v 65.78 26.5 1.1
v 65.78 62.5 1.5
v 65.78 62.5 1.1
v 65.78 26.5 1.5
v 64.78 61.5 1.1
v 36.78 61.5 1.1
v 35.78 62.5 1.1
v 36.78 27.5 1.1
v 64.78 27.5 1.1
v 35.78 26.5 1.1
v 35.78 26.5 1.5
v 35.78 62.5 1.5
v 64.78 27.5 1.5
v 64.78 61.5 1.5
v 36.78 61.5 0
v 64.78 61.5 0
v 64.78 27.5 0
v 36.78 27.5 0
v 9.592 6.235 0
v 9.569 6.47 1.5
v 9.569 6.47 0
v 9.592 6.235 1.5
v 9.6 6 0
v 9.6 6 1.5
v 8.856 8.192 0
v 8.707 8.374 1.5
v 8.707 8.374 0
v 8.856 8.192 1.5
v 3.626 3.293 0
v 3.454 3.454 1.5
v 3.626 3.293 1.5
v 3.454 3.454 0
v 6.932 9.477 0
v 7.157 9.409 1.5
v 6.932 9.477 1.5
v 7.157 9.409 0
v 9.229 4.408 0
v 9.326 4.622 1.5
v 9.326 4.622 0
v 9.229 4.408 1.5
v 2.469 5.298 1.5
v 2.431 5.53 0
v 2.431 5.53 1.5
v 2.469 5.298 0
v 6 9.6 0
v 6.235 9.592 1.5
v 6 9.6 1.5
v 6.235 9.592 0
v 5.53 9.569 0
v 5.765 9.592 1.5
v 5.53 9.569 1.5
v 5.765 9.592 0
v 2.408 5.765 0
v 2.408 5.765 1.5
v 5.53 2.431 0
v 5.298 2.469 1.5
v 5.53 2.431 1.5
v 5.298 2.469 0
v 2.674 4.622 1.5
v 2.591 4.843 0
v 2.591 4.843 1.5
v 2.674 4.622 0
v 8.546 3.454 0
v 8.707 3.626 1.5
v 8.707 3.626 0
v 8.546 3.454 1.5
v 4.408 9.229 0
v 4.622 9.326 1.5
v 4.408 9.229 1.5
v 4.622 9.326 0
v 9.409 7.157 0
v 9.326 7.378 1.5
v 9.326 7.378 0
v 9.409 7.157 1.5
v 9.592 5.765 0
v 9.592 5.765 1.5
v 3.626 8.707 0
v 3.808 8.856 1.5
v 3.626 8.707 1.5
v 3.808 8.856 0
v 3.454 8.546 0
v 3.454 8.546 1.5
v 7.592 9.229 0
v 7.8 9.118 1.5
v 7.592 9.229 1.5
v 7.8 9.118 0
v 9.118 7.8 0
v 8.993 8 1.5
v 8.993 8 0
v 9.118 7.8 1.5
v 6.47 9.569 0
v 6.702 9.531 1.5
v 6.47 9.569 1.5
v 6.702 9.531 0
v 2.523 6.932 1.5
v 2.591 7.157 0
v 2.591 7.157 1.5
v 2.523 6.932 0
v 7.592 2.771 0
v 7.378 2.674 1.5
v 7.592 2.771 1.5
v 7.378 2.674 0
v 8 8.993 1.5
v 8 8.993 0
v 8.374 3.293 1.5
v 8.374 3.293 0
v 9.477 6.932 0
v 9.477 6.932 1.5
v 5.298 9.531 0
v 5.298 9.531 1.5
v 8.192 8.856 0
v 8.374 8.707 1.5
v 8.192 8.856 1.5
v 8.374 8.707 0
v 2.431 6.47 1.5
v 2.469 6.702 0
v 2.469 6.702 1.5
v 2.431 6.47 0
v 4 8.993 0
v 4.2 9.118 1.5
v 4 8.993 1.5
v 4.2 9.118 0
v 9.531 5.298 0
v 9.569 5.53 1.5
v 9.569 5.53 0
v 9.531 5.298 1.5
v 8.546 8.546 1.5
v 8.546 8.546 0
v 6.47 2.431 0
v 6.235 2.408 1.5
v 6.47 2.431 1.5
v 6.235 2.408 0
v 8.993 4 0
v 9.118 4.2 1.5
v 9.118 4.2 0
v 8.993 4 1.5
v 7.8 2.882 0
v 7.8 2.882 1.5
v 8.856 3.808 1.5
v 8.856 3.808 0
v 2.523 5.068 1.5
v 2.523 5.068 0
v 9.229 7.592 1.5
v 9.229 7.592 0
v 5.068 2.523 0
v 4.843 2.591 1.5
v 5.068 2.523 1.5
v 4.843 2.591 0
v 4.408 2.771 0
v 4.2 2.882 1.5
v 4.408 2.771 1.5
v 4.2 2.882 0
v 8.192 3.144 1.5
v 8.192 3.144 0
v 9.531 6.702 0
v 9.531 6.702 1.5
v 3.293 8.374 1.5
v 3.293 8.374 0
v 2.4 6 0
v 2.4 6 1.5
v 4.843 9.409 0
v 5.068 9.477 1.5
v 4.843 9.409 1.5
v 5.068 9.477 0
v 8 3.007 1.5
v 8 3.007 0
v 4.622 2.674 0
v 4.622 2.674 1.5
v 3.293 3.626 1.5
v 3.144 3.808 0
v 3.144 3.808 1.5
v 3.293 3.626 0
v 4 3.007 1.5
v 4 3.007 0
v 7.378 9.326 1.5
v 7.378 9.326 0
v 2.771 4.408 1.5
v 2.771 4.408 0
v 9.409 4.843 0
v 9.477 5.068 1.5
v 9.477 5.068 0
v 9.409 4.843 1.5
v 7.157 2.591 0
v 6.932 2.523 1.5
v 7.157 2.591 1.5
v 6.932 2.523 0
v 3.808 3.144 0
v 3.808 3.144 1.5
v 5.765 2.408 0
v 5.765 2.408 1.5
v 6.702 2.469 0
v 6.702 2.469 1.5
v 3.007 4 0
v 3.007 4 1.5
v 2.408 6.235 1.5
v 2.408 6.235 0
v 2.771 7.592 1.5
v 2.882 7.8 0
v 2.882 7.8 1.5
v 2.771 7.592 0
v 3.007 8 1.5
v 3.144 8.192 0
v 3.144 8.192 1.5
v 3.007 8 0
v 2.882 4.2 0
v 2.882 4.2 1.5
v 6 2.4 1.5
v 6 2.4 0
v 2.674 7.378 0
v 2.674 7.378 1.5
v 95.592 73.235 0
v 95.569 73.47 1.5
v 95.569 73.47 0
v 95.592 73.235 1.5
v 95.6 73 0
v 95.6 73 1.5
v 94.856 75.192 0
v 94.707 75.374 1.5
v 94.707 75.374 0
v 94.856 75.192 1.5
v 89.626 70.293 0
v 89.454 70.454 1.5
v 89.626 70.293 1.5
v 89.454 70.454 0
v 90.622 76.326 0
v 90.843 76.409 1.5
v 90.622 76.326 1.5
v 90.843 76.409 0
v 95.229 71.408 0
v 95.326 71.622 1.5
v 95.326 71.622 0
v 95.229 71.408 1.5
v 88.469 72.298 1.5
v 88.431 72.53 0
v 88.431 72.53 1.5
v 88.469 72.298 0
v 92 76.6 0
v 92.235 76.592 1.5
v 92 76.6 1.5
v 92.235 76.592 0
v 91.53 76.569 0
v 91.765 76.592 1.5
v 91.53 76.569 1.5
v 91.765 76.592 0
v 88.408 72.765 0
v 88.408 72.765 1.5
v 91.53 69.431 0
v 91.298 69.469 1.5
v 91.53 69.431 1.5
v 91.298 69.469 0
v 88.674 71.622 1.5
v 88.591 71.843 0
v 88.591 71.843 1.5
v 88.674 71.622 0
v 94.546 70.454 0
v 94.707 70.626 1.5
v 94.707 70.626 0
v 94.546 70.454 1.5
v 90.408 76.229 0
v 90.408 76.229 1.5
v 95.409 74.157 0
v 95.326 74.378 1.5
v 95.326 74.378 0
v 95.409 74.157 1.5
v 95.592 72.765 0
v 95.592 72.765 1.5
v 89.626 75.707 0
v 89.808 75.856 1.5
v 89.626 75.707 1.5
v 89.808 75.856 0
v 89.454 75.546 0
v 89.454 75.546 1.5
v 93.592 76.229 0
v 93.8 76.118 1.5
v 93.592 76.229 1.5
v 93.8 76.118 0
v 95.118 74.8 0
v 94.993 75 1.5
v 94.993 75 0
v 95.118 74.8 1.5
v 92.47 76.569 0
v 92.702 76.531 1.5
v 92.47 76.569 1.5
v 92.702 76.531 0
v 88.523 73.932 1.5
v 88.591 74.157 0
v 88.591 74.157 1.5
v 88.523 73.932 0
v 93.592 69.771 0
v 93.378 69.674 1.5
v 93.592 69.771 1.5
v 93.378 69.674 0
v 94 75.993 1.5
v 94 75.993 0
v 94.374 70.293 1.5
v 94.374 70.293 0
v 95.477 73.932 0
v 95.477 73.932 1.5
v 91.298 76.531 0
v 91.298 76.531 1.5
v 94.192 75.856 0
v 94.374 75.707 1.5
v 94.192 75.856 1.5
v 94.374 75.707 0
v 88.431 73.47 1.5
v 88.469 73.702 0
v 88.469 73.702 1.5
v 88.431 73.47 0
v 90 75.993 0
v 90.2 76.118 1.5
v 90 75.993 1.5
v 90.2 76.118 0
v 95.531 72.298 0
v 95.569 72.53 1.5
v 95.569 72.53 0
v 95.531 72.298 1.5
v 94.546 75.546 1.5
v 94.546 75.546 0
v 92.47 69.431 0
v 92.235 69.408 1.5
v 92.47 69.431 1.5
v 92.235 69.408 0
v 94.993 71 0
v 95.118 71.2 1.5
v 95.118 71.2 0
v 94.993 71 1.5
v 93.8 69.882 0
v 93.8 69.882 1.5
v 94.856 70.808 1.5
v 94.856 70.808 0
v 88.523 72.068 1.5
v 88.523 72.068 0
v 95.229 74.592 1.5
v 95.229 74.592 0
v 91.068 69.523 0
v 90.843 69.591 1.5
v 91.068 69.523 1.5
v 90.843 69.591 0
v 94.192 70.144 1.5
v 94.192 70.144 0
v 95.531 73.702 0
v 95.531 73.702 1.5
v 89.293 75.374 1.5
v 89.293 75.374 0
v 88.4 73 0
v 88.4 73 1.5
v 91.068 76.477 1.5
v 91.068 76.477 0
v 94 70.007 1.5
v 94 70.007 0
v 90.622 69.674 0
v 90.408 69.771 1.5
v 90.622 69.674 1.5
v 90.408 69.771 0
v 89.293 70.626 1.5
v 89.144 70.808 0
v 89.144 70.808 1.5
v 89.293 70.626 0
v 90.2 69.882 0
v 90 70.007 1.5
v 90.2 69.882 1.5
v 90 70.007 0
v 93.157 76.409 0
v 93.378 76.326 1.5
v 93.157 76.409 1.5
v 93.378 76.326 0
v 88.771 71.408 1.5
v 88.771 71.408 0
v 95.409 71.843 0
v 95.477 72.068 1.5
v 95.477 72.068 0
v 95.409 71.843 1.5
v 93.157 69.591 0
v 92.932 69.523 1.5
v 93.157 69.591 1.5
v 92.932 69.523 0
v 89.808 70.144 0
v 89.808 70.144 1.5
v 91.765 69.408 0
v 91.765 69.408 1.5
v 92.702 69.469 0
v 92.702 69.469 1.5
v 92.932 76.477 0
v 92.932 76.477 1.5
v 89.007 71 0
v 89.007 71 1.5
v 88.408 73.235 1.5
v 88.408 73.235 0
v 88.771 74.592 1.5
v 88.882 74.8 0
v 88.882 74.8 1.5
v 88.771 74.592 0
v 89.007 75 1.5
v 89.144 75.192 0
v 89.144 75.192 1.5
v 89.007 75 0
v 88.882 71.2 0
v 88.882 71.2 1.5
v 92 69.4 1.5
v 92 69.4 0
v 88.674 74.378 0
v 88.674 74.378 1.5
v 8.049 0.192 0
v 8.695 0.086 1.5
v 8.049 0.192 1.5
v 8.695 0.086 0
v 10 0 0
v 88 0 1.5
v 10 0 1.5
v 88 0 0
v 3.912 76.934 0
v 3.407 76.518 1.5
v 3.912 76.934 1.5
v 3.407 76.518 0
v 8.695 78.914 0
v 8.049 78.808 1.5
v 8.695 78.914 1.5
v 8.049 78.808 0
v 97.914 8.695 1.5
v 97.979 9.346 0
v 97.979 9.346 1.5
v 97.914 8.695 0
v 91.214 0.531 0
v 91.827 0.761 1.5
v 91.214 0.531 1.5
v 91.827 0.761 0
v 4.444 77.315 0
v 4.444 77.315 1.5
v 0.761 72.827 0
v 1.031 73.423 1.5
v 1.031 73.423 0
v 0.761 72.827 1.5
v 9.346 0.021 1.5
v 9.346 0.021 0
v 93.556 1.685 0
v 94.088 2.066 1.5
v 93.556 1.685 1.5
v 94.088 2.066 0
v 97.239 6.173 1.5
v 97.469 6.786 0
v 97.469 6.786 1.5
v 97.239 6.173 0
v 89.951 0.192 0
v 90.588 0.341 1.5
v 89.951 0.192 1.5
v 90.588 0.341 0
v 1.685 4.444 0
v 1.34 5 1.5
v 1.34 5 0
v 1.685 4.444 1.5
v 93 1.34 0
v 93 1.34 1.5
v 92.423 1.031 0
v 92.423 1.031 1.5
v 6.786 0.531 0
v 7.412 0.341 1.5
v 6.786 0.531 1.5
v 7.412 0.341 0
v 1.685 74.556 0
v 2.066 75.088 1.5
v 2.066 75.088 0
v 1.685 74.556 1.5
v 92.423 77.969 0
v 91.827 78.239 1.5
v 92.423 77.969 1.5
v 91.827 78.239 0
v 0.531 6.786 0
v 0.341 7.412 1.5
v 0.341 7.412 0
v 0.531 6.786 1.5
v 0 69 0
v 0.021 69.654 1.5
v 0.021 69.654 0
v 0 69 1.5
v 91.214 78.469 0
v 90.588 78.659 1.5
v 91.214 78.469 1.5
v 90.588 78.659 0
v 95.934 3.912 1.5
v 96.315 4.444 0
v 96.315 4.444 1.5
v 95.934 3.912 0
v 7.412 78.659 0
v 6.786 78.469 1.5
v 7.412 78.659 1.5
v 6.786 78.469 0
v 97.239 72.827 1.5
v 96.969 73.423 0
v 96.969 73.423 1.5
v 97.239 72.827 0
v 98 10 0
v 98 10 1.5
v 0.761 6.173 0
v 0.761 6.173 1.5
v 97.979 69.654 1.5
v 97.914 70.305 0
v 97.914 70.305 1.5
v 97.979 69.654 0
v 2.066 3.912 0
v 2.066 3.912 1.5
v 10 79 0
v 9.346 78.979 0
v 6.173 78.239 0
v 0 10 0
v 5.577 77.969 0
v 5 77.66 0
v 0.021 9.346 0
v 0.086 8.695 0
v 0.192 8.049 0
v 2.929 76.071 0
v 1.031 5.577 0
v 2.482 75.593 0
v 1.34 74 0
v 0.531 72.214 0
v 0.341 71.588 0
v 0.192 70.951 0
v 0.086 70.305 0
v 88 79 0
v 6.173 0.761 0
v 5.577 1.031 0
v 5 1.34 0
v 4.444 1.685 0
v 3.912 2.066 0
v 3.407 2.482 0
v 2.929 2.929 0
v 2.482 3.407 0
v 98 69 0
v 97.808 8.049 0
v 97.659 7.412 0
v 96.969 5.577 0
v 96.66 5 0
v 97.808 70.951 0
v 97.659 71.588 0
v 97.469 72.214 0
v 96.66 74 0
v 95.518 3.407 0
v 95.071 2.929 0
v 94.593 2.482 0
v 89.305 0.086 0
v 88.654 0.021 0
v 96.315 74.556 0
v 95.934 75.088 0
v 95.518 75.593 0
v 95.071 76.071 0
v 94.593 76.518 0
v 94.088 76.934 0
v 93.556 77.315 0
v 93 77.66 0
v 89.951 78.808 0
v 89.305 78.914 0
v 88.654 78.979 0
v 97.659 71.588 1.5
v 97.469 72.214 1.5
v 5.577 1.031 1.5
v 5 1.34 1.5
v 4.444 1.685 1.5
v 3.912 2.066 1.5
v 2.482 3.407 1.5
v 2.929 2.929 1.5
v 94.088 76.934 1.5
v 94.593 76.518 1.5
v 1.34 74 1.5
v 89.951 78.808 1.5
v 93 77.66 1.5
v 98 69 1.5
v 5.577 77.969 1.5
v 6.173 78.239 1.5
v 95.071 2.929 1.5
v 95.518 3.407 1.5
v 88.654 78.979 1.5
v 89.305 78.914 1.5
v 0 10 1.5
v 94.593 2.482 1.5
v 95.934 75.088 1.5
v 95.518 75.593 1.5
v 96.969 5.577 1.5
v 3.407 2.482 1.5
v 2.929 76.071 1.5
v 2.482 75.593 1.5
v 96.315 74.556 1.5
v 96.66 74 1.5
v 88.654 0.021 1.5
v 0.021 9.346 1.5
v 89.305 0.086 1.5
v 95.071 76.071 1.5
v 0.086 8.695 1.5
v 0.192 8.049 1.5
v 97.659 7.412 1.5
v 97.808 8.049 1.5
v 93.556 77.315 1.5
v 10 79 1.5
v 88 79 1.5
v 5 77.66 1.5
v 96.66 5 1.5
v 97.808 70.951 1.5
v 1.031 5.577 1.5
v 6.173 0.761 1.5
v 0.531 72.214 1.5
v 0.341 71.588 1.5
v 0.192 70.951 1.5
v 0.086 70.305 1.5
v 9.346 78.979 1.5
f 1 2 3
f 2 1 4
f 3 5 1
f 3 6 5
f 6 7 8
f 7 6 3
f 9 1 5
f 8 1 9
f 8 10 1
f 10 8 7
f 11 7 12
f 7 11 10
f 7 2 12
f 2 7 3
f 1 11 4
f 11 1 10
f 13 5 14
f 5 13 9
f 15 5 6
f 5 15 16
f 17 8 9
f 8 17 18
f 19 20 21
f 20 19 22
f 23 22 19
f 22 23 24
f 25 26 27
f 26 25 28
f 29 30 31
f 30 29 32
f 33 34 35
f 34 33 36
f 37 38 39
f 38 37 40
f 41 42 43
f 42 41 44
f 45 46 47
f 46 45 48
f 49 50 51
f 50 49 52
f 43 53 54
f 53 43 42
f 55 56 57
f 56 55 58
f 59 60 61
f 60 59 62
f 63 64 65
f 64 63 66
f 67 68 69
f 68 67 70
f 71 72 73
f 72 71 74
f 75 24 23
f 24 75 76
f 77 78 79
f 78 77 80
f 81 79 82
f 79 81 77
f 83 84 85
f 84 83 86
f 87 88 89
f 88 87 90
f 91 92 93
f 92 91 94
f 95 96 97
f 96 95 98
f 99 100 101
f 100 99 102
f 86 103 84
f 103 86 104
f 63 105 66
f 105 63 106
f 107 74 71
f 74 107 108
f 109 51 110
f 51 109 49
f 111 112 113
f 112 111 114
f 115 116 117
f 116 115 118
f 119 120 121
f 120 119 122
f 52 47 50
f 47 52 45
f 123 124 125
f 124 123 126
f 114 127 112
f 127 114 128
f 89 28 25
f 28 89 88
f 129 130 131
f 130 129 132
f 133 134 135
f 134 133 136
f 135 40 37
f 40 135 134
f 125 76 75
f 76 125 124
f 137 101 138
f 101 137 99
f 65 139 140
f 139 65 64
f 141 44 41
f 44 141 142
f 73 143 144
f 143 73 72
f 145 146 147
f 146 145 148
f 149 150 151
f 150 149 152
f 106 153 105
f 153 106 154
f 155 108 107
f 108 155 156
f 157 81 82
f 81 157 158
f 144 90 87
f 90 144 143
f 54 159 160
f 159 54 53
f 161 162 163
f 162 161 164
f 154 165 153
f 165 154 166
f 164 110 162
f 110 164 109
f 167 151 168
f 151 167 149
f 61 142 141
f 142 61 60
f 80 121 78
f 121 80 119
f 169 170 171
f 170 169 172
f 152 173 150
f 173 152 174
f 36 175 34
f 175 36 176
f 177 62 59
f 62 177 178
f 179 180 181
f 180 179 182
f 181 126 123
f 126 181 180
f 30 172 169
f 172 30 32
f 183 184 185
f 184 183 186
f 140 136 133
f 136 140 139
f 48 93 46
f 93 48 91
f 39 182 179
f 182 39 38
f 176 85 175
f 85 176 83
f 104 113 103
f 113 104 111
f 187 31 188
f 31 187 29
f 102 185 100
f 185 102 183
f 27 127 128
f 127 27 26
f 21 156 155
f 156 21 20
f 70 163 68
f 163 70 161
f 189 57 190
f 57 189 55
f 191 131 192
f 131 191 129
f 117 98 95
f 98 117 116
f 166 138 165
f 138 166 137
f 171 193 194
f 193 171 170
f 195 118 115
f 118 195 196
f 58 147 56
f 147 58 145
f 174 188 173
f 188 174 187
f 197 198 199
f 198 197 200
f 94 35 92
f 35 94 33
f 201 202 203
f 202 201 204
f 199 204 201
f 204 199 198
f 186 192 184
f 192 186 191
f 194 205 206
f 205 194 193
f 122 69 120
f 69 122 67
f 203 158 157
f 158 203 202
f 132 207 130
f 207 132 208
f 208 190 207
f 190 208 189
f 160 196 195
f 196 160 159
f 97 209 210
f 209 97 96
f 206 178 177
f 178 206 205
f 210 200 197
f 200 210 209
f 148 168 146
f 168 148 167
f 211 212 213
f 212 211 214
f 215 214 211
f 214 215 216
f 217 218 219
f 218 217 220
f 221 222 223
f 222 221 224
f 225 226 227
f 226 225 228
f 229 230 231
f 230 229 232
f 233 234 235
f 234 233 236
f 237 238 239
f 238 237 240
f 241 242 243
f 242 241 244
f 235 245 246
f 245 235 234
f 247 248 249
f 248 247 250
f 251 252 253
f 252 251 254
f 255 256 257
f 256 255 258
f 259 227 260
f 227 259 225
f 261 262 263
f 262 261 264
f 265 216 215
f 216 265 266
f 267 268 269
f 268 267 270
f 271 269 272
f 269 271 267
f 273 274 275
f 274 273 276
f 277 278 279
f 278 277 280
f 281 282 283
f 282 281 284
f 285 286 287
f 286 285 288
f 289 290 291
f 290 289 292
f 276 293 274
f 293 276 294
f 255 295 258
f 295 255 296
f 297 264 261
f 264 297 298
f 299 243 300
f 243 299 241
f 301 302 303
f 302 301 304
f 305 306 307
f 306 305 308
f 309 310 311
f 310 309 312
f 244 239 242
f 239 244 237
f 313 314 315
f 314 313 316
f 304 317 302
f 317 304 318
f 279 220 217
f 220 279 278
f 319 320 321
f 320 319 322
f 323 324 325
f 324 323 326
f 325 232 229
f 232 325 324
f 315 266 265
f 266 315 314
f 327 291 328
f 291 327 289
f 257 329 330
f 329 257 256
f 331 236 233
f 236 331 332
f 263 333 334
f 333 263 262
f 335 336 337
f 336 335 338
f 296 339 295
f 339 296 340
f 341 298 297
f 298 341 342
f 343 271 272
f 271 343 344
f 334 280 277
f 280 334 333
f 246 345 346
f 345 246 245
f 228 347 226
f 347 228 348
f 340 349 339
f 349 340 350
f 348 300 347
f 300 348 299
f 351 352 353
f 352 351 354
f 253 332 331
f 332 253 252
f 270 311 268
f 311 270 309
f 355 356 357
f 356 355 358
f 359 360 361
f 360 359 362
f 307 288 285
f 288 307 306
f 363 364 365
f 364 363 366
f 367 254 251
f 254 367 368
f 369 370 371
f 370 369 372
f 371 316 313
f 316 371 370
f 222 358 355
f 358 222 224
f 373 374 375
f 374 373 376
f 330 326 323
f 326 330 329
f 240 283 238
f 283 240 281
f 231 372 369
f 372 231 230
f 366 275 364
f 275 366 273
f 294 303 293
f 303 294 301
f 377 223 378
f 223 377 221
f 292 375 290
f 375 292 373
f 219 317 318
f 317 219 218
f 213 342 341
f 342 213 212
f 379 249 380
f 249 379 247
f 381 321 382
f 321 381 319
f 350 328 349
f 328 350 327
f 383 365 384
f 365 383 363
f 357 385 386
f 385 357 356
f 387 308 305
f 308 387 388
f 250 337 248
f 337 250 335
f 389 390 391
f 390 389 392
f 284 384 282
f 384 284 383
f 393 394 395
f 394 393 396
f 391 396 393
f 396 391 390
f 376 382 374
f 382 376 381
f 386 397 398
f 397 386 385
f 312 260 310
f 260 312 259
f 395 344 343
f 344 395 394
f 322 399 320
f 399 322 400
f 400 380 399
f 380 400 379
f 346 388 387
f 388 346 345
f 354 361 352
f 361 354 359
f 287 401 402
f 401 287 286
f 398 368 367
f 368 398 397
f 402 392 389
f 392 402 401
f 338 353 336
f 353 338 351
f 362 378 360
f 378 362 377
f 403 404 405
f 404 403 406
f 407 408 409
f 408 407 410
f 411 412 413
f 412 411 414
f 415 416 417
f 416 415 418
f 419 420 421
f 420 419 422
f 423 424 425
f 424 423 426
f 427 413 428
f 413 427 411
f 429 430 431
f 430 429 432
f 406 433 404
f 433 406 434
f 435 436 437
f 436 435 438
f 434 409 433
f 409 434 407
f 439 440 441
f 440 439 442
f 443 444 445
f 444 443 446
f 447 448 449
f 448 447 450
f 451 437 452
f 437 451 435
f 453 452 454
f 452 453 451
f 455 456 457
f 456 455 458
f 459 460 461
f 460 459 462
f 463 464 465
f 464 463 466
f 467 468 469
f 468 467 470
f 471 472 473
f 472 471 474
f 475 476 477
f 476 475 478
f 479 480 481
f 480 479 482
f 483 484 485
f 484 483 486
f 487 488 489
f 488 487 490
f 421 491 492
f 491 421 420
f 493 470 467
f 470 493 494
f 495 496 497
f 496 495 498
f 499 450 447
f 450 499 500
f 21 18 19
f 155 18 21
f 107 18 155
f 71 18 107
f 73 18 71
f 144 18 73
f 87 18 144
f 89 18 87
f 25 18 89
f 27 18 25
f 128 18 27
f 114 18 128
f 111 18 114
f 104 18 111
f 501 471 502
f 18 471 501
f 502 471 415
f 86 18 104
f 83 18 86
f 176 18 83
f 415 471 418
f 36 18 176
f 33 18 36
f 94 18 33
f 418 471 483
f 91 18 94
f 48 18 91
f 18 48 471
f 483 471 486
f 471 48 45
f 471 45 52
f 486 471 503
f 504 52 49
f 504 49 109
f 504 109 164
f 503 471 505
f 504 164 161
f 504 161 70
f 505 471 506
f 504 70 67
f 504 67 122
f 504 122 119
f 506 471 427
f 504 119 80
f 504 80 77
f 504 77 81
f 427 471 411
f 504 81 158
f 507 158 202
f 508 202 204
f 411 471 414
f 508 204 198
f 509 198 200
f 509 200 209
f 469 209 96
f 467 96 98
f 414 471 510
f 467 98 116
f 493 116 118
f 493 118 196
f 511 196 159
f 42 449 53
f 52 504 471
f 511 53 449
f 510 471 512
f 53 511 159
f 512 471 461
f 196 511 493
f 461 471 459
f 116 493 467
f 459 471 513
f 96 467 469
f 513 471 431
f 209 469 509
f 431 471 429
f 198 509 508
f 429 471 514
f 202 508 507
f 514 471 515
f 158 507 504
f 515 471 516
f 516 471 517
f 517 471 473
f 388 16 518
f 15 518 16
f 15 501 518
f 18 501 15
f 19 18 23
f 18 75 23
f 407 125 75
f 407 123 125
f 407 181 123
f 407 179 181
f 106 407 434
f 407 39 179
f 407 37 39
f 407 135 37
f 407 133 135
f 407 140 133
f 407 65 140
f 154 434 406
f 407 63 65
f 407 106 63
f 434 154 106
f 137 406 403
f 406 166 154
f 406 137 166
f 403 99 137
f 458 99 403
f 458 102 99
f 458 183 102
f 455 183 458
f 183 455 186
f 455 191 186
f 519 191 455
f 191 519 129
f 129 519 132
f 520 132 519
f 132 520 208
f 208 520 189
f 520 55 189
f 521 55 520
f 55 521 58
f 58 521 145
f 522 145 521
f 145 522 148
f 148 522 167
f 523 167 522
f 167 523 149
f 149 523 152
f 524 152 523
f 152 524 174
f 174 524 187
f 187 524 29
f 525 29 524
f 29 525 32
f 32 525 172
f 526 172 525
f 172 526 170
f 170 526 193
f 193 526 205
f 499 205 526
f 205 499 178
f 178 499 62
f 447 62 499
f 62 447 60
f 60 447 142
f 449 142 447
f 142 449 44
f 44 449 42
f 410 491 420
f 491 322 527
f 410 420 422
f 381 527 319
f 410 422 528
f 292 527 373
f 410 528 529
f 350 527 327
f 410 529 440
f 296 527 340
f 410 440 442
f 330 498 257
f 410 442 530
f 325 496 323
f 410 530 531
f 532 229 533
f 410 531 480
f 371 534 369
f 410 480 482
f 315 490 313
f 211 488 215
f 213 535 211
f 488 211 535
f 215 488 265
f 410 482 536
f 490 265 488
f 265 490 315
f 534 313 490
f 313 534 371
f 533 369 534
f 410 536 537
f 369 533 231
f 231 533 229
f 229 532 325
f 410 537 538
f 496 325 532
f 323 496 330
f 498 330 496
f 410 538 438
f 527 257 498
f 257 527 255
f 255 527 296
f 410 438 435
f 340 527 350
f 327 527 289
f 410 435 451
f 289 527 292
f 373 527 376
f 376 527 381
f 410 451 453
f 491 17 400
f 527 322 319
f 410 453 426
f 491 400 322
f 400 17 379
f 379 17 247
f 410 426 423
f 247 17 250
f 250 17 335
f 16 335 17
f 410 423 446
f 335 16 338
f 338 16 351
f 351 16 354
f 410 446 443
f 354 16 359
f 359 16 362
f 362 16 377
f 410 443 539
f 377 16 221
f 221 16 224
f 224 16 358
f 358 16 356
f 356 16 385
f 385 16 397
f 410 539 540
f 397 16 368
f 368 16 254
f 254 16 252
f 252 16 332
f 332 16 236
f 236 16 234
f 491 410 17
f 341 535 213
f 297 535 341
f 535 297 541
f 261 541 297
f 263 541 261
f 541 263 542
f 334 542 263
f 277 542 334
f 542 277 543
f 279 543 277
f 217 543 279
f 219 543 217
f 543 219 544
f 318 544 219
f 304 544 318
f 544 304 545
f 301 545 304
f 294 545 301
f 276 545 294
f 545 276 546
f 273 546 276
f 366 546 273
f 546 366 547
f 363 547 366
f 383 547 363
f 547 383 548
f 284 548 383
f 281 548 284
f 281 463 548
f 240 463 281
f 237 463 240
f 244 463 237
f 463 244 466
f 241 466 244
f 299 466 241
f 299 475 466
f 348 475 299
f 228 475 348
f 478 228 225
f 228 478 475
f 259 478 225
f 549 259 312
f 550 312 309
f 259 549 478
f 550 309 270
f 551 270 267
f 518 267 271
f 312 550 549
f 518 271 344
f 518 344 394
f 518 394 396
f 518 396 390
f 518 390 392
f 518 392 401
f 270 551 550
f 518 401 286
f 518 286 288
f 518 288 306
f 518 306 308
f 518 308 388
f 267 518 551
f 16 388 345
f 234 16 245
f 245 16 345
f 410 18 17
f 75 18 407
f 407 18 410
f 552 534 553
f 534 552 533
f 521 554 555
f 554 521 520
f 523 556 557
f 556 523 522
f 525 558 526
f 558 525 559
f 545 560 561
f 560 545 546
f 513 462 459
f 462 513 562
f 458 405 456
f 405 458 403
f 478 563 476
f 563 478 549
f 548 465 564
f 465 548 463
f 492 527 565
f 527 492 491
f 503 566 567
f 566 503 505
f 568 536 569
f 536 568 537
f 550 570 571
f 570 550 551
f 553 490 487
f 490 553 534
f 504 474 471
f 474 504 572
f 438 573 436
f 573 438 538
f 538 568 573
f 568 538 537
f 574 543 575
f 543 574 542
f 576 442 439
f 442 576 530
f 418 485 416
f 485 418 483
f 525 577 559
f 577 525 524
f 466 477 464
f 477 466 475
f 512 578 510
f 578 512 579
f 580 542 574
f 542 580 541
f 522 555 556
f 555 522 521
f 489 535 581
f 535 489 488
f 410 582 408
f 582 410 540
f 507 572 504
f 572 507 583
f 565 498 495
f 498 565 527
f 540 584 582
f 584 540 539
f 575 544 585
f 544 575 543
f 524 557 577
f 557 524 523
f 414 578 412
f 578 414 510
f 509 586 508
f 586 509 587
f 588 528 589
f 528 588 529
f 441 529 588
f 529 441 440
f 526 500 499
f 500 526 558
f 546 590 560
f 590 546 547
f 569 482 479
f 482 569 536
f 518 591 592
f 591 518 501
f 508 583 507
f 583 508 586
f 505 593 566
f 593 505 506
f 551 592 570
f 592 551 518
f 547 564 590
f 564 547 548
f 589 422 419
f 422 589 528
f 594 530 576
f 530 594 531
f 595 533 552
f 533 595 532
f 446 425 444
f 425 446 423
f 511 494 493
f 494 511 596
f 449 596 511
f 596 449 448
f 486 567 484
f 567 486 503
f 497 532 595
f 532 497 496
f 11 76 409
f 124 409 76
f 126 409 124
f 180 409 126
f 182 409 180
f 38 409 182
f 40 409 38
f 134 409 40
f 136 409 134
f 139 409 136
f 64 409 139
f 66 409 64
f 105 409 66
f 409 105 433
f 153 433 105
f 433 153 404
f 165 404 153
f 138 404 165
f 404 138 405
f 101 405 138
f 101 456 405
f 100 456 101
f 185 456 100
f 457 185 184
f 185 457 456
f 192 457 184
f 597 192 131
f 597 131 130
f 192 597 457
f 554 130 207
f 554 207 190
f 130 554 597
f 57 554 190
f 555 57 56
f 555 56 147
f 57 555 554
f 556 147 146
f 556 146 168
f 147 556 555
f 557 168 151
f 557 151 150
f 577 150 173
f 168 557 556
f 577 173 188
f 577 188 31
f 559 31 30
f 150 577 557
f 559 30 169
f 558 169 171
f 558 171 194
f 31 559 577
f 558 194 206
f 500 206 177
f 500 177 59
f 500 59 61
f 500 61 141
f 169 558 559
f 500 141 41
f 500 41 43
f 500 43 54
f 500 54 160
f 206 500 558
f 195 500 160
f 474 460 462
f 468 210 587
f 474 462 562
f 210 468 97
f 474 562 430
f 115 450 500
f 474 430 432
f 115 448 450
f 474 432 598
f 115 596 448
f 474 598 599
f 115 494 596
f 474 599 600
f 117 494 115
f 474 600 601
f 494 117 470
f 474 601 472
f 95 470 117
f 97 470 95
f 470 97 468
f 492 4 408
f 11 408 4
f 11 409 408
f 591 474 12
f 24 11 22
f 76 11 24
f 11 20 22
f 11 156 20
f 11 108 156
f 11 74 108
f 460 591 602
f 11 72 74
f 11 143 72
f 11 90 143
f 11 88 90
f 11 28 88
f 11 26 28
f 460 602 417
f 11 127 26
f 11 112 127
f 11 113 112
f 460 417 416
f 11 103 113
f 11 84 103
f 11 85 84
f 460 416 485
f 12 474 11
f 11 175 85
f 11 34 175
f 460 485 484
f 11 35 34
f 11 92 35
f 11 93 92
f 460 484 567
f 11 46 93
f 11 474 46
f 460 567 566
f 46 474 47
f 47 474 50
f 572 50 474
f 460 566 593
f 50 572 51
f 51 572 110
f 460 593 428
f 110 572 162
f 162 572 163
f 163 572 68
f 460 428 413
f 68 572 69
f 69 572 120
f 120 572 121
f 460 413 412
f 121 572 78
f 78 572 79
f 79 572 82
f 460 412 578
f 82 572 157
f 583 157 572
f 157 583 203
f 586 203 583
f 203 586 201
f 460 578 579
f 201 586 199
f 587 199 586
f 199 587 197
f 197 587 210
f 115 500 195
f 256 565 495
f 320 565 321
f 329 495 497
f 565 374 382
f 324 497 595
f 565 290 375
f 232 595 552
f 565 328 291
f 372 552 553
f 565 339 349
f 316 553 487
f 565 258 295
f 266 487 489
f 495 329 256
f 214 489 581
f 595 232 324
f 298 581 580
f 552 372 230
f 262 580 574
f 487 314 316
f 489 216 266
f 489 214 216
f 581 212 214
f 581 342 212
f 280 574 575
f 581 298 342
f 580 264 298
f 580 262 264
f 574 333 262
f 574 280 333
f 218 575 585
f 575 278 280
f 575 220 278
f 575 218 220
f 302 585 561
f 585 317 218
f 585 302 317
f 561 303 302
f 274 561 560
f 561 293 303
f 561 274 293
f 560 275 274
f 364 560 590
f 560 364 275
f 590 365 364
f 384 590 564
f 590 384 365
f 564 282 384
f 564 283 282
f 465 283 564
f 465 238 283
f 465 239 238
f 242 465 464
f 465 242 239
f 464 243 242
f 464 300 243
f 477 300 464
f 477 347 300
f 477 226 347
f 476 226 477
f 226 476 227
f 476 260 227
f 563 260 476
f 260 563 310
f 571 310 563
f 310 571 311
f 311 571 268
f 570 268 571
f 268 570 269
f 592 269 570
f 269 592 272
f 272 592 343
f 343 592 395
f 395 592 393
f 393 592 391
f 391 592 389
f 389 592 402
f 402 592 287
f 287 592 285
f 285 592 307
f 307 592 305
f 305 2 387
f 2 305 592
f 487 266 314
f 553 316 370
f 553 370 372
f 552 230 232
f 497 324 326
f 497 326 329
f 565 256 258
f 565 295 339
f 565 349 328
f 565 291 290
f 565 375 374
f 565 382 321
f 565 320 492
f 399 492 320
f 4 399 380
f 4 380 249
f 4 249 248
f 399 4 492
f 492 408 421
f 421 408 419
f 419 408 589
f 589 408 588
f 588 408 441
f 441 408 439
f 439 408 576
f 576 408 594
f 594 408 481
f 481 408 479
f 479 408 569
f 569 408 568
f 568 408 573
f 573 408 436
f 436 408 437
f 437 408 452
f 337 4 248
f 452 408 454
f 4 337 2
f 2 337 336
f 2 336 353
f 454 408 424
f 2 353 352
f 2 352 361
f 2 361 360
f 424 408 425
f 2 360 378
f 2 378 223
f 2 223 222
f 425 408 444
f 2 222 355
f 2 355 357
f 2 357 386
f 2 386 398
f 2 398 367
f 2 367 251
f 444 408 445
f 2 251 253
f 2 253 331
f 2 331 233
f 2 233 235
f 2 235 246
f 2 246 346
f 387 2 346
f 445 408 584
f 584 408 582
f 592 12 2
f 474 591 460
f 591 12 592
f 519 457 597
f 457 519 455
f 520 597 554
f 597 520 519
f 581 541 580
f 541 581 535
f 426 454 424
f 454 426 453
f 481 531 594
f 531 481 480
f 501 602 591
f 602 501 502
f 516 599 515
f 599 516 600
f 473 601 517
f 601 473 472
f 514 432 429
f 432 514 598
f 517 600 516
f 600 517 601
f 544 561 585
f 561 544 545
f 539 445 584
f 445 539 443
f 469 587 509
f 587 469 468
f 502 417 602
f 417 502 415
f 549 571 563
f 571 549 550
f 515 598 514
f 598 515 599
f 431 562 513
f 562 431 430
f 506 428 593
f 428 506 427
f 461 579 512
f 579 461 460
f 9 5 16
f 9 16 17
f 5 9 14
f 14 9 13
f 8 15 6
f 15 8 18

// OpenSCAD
// =============================================================================
// SupaClock V3 - Faceplate (skin intercambiable, plug-and-play)
//
// Pieza cosmetica que se monta sobre el top_case core mediante:
//   retention = "snap"     -> 2 cantilevers macho + 2 pines guia
//   retention = "magnetic" -> 4 imanes Ø5x2 embebidos + 2 pines guia
//
// Estilos disponibles:
//   style = "minimal"  -> sin decoracion, solo bezel display
//   style = "classic"  -> 12 marcas horarias grabadas
//   style = "sport"    -> bezel grueso con numerales 5/15/25/35/45/55
//
// Coords case-local. Z=0 = cara inferior del faceplate (apoya sobre techo
// del core a Z_abs = H_total = 17). Z=2 = cara exterior superior.
// =============================================================================

$fn = 96;
eps = 0.01;

// ============================ PARAMETROS PRINCIPALES =========================
retention = "magnetic";    // "magnetic" | "snap"
style     = "minimal";     // "minimal" | "classic" | "sport"
// =============================================================================

// ---------------------------- DIMENSIONES BASE -------------------------------
outer_x        = 98.0;
outer_y        = 79.0;
r_vert         = 12.0;
taper          = 2.0;
H_total        = 17.0;
pcb_off_x      = 6.5;
pcb_off_y      = 6.0;
grosor_pared   = 2.0;

faceplate_slab = 1.5;    // espesor del slab cosmetico
retention_h    = 3.0;    // largo de los pins / cantilevers hacia abajo
faceplate_total_z = faceplate_slab + 0.5;  // = 2.0 mm visible

// El radio del faceplate sigue al envelope al Z=H_total (cara superior del core)
r_face = r_vert - taper;   // = 10 mm

// ---------------------- DISPLAY ----------------------------------------------
display_pos    = [44.28, 38.5];
display_w      = 28.0;
display_h      = 34.0;
bezel_extra    = 2.0;     // bezel cosmetico de 2 mm alrededor de la ventana
bezel_depth    = 0.4;     // recess en la cara superior

// ---------------------- RETENTION (mismo que top_case) -----------------------
// V3.2: diagonal SW-NE con 2 imanes Ø7 x 1.5 mm, otras 2 esquinas con pines
// guia macho Ø2 mm que entran a los huecos del core.
ret_inset     = 6.0;
ret_positions = [
    [ret_inset,             ret_inset],            // SW - iman
    [outer_x - ret_inset,   ret_inset],            // SE - pin guia
    [ret_inset,             outer_y - ret_inset],  // NW - pin guia
    [outer_x - ret_inset,   outer_y - ret_inset]   // NE - iman
];
ret_is_magnet = [true, false, false, true];

// Pines guia macho
guide_pin_d   = 2.0;
guide_pin_h   = 3.0;

// Snap cantilever
snap_w        = 3.8;
snap_h        = 1.2;
snap_len      = 5.0;
snap_hook     = 0.4;

// Imanes Ø7 x 1.5 mm (mismo modelo que en top_case)
magnet_hole_d = 7.2;
magnet_hole_h = 1.6;

// =============================================================================
// FORMA EXTERIOR
// =============================================================================
// Slab con esquinas redondeadas siguiendo el envelope del core en Z=H_total

module faceplate_slab() {
    hull() {
        for (x = [r_face, outer_x - r_face],
             y = [r_face, outer_y - r_face])
            translate([x, y, 0])
                cylinder(h = faceplate_slab, r = r_face);
    }
}

// =============================================================================
// VENTANA DISPLAY + BEZEL COSMETICO
// =============================================================================

module display_window_cut() {
    translate([display_pos[0] + pcb_off_x - display_w / 2,
               display_pos[1] + pcb_off_y - display_h / 2,
               -eps])
        cube([display_w, display_h, faceplate_slab + 2 * eps]);
}

module display_bezel_recess() {
    // Recess (0.4 mm de profundidad) en la cara SUPERIOR alrededor de la ventana
    translate([display_pos[0] + pcb_off_x - (display_w + bezel_extra) / 2,
               display_pos[1] + pcb_off_y - (display_h + bezel_extra) / 2,
               faceplate_slab - bezel_depth])
        difference() {
            cube([display_w + bezel_extra,
                  display_h + bezel_extra,
                  bezel_depth + eps]);
            translate([bezel_extra / 2, bezel_extra / 2, -eps])
                cube([display_w, display_h, bezel_depth + 2 * eps]);
        }
}

// =============================================================================
// DECORACION segun STYLE
// =============================================================================

module style_classic_marks() {
    // 12 marcas horarias circulares Ø1 mm grabadas 0.3 mm
    cx = display_pos[0] + pcb_off_x;
    cy = display_pos[1] + pcb_off_y;
    r_marks = 19.0;
    for (i = [0 : 11]) {
        ang = i * 30;   // grados
        x = cx + r_marks * cos(ang);
        y = cy + r_marks * sin(ang);
        translate([x, y, faceplate_slab - 0.3])
            cylinder(h = 0.3 + eps, d = 1.0);
    }
}

module style_sport_numerals() {
    // Numerales 5/15/25/35/45/55 en relieve negativo
    cx = display_pos[0] + pcb_off_x;
    cy = display_pos[1] + pcb_off_y;
    r_num = 21.0;
    labels = ["55", "5", "15", "25", "35", "45"];
    for (i = [0 : 5]) {
        ang = 60 + i * 60;   // empieza arriba, sentido horario
        x = cx + r_num * cos(ang);
        y = cy + r_num * sin(ang);
        translate([x, y, faceplate_slab - 0.4])
            linear_extrude(height = 0.4 + eps)
                text(labels[i], size = 3.0, halign = "center", valign = "center",
                     font = "Liberation Sans:style=Bold");
    }
}

// =============================================================================
// RETENTION FEATURES (cara inferior)
// =============================================================================

module snap_cantilever(pos) {
    dir_x = (pos[0] < outer_x / 2) ? 1 : -1;
    translate([pos[0] - snap_w / 2,
               pos[1] - snap_w / 2,
               -snap_len])
        cube([snap_w, snap_w, snap_len + eps]);
    // Hook al final (engagement)
    translate([pos[0] - snap_w / 2 - snap_hook * (dir_x < 0 ? 1 : 0),
               pos[1] - snap_w / 2,
               -snap_len + 0.5])
        cube([snap_w + snap_hook, snap_w, 0.6]);
}

module magnet_pocket(pos) {
    // Hueco en la cara INFERIOR del slab (que mira al core).
    // Atraviesa 1.6 mm del slab de 1.5 mm => no llega a la cara superior
    // visible (queda con 0 tapa, el iman se ve flush por debajo y queda
    // 0.0 mm cubierto arriba; aceptable porque la cara superior no se ve
    // donde estan los imanes -> queda 0.0 tapa).
    // Si quieres tapa visible, aumenta faceplate_slab a 2.0 mm.
    translate([pos[0], pos[1], -eps])
        cylinder(h = magnet_hole_h + eps, d = magnet_hole_d);
}

module retention_features() {
    // V3.3: magnetic => solo 2 huecos en diagonal (sin pines guia macho).
    // Las esquinas SE-NW del faceplate quedan limpias.
    if (retention == "snap") {
        for (pos = ret_positions) snap_cantilever(pos);
    }
    // magnetic: no genera features macho; los huecos para imanes se restan
    // del slab en retention_holes_in_slab.
}

module retention_holes_in_slab() {
    if (retention == "magnetic") {
        // V3.2: solo 2 huecos en diagonal SW-NE
        for (i = [0 : len(ret_positions) - 1]) {
            if (ret_is_magnet[i]) magnet_pocket(ret_positions[i]);
        }
    }
}

// =============================================================================
// CONSTRUCCION
// =============================================================================

union() {
    difference() {
        faceplate_slab();
        display_window_cut();
        display_bezel_recess();
        if (style == "classic") style_classic_marks();
        if (style == "sport")   style_sport_numerals();
        retention_holes_in_slab();
    }
    // Features que descuelgan de la cara inferior
    retention_features();
}
